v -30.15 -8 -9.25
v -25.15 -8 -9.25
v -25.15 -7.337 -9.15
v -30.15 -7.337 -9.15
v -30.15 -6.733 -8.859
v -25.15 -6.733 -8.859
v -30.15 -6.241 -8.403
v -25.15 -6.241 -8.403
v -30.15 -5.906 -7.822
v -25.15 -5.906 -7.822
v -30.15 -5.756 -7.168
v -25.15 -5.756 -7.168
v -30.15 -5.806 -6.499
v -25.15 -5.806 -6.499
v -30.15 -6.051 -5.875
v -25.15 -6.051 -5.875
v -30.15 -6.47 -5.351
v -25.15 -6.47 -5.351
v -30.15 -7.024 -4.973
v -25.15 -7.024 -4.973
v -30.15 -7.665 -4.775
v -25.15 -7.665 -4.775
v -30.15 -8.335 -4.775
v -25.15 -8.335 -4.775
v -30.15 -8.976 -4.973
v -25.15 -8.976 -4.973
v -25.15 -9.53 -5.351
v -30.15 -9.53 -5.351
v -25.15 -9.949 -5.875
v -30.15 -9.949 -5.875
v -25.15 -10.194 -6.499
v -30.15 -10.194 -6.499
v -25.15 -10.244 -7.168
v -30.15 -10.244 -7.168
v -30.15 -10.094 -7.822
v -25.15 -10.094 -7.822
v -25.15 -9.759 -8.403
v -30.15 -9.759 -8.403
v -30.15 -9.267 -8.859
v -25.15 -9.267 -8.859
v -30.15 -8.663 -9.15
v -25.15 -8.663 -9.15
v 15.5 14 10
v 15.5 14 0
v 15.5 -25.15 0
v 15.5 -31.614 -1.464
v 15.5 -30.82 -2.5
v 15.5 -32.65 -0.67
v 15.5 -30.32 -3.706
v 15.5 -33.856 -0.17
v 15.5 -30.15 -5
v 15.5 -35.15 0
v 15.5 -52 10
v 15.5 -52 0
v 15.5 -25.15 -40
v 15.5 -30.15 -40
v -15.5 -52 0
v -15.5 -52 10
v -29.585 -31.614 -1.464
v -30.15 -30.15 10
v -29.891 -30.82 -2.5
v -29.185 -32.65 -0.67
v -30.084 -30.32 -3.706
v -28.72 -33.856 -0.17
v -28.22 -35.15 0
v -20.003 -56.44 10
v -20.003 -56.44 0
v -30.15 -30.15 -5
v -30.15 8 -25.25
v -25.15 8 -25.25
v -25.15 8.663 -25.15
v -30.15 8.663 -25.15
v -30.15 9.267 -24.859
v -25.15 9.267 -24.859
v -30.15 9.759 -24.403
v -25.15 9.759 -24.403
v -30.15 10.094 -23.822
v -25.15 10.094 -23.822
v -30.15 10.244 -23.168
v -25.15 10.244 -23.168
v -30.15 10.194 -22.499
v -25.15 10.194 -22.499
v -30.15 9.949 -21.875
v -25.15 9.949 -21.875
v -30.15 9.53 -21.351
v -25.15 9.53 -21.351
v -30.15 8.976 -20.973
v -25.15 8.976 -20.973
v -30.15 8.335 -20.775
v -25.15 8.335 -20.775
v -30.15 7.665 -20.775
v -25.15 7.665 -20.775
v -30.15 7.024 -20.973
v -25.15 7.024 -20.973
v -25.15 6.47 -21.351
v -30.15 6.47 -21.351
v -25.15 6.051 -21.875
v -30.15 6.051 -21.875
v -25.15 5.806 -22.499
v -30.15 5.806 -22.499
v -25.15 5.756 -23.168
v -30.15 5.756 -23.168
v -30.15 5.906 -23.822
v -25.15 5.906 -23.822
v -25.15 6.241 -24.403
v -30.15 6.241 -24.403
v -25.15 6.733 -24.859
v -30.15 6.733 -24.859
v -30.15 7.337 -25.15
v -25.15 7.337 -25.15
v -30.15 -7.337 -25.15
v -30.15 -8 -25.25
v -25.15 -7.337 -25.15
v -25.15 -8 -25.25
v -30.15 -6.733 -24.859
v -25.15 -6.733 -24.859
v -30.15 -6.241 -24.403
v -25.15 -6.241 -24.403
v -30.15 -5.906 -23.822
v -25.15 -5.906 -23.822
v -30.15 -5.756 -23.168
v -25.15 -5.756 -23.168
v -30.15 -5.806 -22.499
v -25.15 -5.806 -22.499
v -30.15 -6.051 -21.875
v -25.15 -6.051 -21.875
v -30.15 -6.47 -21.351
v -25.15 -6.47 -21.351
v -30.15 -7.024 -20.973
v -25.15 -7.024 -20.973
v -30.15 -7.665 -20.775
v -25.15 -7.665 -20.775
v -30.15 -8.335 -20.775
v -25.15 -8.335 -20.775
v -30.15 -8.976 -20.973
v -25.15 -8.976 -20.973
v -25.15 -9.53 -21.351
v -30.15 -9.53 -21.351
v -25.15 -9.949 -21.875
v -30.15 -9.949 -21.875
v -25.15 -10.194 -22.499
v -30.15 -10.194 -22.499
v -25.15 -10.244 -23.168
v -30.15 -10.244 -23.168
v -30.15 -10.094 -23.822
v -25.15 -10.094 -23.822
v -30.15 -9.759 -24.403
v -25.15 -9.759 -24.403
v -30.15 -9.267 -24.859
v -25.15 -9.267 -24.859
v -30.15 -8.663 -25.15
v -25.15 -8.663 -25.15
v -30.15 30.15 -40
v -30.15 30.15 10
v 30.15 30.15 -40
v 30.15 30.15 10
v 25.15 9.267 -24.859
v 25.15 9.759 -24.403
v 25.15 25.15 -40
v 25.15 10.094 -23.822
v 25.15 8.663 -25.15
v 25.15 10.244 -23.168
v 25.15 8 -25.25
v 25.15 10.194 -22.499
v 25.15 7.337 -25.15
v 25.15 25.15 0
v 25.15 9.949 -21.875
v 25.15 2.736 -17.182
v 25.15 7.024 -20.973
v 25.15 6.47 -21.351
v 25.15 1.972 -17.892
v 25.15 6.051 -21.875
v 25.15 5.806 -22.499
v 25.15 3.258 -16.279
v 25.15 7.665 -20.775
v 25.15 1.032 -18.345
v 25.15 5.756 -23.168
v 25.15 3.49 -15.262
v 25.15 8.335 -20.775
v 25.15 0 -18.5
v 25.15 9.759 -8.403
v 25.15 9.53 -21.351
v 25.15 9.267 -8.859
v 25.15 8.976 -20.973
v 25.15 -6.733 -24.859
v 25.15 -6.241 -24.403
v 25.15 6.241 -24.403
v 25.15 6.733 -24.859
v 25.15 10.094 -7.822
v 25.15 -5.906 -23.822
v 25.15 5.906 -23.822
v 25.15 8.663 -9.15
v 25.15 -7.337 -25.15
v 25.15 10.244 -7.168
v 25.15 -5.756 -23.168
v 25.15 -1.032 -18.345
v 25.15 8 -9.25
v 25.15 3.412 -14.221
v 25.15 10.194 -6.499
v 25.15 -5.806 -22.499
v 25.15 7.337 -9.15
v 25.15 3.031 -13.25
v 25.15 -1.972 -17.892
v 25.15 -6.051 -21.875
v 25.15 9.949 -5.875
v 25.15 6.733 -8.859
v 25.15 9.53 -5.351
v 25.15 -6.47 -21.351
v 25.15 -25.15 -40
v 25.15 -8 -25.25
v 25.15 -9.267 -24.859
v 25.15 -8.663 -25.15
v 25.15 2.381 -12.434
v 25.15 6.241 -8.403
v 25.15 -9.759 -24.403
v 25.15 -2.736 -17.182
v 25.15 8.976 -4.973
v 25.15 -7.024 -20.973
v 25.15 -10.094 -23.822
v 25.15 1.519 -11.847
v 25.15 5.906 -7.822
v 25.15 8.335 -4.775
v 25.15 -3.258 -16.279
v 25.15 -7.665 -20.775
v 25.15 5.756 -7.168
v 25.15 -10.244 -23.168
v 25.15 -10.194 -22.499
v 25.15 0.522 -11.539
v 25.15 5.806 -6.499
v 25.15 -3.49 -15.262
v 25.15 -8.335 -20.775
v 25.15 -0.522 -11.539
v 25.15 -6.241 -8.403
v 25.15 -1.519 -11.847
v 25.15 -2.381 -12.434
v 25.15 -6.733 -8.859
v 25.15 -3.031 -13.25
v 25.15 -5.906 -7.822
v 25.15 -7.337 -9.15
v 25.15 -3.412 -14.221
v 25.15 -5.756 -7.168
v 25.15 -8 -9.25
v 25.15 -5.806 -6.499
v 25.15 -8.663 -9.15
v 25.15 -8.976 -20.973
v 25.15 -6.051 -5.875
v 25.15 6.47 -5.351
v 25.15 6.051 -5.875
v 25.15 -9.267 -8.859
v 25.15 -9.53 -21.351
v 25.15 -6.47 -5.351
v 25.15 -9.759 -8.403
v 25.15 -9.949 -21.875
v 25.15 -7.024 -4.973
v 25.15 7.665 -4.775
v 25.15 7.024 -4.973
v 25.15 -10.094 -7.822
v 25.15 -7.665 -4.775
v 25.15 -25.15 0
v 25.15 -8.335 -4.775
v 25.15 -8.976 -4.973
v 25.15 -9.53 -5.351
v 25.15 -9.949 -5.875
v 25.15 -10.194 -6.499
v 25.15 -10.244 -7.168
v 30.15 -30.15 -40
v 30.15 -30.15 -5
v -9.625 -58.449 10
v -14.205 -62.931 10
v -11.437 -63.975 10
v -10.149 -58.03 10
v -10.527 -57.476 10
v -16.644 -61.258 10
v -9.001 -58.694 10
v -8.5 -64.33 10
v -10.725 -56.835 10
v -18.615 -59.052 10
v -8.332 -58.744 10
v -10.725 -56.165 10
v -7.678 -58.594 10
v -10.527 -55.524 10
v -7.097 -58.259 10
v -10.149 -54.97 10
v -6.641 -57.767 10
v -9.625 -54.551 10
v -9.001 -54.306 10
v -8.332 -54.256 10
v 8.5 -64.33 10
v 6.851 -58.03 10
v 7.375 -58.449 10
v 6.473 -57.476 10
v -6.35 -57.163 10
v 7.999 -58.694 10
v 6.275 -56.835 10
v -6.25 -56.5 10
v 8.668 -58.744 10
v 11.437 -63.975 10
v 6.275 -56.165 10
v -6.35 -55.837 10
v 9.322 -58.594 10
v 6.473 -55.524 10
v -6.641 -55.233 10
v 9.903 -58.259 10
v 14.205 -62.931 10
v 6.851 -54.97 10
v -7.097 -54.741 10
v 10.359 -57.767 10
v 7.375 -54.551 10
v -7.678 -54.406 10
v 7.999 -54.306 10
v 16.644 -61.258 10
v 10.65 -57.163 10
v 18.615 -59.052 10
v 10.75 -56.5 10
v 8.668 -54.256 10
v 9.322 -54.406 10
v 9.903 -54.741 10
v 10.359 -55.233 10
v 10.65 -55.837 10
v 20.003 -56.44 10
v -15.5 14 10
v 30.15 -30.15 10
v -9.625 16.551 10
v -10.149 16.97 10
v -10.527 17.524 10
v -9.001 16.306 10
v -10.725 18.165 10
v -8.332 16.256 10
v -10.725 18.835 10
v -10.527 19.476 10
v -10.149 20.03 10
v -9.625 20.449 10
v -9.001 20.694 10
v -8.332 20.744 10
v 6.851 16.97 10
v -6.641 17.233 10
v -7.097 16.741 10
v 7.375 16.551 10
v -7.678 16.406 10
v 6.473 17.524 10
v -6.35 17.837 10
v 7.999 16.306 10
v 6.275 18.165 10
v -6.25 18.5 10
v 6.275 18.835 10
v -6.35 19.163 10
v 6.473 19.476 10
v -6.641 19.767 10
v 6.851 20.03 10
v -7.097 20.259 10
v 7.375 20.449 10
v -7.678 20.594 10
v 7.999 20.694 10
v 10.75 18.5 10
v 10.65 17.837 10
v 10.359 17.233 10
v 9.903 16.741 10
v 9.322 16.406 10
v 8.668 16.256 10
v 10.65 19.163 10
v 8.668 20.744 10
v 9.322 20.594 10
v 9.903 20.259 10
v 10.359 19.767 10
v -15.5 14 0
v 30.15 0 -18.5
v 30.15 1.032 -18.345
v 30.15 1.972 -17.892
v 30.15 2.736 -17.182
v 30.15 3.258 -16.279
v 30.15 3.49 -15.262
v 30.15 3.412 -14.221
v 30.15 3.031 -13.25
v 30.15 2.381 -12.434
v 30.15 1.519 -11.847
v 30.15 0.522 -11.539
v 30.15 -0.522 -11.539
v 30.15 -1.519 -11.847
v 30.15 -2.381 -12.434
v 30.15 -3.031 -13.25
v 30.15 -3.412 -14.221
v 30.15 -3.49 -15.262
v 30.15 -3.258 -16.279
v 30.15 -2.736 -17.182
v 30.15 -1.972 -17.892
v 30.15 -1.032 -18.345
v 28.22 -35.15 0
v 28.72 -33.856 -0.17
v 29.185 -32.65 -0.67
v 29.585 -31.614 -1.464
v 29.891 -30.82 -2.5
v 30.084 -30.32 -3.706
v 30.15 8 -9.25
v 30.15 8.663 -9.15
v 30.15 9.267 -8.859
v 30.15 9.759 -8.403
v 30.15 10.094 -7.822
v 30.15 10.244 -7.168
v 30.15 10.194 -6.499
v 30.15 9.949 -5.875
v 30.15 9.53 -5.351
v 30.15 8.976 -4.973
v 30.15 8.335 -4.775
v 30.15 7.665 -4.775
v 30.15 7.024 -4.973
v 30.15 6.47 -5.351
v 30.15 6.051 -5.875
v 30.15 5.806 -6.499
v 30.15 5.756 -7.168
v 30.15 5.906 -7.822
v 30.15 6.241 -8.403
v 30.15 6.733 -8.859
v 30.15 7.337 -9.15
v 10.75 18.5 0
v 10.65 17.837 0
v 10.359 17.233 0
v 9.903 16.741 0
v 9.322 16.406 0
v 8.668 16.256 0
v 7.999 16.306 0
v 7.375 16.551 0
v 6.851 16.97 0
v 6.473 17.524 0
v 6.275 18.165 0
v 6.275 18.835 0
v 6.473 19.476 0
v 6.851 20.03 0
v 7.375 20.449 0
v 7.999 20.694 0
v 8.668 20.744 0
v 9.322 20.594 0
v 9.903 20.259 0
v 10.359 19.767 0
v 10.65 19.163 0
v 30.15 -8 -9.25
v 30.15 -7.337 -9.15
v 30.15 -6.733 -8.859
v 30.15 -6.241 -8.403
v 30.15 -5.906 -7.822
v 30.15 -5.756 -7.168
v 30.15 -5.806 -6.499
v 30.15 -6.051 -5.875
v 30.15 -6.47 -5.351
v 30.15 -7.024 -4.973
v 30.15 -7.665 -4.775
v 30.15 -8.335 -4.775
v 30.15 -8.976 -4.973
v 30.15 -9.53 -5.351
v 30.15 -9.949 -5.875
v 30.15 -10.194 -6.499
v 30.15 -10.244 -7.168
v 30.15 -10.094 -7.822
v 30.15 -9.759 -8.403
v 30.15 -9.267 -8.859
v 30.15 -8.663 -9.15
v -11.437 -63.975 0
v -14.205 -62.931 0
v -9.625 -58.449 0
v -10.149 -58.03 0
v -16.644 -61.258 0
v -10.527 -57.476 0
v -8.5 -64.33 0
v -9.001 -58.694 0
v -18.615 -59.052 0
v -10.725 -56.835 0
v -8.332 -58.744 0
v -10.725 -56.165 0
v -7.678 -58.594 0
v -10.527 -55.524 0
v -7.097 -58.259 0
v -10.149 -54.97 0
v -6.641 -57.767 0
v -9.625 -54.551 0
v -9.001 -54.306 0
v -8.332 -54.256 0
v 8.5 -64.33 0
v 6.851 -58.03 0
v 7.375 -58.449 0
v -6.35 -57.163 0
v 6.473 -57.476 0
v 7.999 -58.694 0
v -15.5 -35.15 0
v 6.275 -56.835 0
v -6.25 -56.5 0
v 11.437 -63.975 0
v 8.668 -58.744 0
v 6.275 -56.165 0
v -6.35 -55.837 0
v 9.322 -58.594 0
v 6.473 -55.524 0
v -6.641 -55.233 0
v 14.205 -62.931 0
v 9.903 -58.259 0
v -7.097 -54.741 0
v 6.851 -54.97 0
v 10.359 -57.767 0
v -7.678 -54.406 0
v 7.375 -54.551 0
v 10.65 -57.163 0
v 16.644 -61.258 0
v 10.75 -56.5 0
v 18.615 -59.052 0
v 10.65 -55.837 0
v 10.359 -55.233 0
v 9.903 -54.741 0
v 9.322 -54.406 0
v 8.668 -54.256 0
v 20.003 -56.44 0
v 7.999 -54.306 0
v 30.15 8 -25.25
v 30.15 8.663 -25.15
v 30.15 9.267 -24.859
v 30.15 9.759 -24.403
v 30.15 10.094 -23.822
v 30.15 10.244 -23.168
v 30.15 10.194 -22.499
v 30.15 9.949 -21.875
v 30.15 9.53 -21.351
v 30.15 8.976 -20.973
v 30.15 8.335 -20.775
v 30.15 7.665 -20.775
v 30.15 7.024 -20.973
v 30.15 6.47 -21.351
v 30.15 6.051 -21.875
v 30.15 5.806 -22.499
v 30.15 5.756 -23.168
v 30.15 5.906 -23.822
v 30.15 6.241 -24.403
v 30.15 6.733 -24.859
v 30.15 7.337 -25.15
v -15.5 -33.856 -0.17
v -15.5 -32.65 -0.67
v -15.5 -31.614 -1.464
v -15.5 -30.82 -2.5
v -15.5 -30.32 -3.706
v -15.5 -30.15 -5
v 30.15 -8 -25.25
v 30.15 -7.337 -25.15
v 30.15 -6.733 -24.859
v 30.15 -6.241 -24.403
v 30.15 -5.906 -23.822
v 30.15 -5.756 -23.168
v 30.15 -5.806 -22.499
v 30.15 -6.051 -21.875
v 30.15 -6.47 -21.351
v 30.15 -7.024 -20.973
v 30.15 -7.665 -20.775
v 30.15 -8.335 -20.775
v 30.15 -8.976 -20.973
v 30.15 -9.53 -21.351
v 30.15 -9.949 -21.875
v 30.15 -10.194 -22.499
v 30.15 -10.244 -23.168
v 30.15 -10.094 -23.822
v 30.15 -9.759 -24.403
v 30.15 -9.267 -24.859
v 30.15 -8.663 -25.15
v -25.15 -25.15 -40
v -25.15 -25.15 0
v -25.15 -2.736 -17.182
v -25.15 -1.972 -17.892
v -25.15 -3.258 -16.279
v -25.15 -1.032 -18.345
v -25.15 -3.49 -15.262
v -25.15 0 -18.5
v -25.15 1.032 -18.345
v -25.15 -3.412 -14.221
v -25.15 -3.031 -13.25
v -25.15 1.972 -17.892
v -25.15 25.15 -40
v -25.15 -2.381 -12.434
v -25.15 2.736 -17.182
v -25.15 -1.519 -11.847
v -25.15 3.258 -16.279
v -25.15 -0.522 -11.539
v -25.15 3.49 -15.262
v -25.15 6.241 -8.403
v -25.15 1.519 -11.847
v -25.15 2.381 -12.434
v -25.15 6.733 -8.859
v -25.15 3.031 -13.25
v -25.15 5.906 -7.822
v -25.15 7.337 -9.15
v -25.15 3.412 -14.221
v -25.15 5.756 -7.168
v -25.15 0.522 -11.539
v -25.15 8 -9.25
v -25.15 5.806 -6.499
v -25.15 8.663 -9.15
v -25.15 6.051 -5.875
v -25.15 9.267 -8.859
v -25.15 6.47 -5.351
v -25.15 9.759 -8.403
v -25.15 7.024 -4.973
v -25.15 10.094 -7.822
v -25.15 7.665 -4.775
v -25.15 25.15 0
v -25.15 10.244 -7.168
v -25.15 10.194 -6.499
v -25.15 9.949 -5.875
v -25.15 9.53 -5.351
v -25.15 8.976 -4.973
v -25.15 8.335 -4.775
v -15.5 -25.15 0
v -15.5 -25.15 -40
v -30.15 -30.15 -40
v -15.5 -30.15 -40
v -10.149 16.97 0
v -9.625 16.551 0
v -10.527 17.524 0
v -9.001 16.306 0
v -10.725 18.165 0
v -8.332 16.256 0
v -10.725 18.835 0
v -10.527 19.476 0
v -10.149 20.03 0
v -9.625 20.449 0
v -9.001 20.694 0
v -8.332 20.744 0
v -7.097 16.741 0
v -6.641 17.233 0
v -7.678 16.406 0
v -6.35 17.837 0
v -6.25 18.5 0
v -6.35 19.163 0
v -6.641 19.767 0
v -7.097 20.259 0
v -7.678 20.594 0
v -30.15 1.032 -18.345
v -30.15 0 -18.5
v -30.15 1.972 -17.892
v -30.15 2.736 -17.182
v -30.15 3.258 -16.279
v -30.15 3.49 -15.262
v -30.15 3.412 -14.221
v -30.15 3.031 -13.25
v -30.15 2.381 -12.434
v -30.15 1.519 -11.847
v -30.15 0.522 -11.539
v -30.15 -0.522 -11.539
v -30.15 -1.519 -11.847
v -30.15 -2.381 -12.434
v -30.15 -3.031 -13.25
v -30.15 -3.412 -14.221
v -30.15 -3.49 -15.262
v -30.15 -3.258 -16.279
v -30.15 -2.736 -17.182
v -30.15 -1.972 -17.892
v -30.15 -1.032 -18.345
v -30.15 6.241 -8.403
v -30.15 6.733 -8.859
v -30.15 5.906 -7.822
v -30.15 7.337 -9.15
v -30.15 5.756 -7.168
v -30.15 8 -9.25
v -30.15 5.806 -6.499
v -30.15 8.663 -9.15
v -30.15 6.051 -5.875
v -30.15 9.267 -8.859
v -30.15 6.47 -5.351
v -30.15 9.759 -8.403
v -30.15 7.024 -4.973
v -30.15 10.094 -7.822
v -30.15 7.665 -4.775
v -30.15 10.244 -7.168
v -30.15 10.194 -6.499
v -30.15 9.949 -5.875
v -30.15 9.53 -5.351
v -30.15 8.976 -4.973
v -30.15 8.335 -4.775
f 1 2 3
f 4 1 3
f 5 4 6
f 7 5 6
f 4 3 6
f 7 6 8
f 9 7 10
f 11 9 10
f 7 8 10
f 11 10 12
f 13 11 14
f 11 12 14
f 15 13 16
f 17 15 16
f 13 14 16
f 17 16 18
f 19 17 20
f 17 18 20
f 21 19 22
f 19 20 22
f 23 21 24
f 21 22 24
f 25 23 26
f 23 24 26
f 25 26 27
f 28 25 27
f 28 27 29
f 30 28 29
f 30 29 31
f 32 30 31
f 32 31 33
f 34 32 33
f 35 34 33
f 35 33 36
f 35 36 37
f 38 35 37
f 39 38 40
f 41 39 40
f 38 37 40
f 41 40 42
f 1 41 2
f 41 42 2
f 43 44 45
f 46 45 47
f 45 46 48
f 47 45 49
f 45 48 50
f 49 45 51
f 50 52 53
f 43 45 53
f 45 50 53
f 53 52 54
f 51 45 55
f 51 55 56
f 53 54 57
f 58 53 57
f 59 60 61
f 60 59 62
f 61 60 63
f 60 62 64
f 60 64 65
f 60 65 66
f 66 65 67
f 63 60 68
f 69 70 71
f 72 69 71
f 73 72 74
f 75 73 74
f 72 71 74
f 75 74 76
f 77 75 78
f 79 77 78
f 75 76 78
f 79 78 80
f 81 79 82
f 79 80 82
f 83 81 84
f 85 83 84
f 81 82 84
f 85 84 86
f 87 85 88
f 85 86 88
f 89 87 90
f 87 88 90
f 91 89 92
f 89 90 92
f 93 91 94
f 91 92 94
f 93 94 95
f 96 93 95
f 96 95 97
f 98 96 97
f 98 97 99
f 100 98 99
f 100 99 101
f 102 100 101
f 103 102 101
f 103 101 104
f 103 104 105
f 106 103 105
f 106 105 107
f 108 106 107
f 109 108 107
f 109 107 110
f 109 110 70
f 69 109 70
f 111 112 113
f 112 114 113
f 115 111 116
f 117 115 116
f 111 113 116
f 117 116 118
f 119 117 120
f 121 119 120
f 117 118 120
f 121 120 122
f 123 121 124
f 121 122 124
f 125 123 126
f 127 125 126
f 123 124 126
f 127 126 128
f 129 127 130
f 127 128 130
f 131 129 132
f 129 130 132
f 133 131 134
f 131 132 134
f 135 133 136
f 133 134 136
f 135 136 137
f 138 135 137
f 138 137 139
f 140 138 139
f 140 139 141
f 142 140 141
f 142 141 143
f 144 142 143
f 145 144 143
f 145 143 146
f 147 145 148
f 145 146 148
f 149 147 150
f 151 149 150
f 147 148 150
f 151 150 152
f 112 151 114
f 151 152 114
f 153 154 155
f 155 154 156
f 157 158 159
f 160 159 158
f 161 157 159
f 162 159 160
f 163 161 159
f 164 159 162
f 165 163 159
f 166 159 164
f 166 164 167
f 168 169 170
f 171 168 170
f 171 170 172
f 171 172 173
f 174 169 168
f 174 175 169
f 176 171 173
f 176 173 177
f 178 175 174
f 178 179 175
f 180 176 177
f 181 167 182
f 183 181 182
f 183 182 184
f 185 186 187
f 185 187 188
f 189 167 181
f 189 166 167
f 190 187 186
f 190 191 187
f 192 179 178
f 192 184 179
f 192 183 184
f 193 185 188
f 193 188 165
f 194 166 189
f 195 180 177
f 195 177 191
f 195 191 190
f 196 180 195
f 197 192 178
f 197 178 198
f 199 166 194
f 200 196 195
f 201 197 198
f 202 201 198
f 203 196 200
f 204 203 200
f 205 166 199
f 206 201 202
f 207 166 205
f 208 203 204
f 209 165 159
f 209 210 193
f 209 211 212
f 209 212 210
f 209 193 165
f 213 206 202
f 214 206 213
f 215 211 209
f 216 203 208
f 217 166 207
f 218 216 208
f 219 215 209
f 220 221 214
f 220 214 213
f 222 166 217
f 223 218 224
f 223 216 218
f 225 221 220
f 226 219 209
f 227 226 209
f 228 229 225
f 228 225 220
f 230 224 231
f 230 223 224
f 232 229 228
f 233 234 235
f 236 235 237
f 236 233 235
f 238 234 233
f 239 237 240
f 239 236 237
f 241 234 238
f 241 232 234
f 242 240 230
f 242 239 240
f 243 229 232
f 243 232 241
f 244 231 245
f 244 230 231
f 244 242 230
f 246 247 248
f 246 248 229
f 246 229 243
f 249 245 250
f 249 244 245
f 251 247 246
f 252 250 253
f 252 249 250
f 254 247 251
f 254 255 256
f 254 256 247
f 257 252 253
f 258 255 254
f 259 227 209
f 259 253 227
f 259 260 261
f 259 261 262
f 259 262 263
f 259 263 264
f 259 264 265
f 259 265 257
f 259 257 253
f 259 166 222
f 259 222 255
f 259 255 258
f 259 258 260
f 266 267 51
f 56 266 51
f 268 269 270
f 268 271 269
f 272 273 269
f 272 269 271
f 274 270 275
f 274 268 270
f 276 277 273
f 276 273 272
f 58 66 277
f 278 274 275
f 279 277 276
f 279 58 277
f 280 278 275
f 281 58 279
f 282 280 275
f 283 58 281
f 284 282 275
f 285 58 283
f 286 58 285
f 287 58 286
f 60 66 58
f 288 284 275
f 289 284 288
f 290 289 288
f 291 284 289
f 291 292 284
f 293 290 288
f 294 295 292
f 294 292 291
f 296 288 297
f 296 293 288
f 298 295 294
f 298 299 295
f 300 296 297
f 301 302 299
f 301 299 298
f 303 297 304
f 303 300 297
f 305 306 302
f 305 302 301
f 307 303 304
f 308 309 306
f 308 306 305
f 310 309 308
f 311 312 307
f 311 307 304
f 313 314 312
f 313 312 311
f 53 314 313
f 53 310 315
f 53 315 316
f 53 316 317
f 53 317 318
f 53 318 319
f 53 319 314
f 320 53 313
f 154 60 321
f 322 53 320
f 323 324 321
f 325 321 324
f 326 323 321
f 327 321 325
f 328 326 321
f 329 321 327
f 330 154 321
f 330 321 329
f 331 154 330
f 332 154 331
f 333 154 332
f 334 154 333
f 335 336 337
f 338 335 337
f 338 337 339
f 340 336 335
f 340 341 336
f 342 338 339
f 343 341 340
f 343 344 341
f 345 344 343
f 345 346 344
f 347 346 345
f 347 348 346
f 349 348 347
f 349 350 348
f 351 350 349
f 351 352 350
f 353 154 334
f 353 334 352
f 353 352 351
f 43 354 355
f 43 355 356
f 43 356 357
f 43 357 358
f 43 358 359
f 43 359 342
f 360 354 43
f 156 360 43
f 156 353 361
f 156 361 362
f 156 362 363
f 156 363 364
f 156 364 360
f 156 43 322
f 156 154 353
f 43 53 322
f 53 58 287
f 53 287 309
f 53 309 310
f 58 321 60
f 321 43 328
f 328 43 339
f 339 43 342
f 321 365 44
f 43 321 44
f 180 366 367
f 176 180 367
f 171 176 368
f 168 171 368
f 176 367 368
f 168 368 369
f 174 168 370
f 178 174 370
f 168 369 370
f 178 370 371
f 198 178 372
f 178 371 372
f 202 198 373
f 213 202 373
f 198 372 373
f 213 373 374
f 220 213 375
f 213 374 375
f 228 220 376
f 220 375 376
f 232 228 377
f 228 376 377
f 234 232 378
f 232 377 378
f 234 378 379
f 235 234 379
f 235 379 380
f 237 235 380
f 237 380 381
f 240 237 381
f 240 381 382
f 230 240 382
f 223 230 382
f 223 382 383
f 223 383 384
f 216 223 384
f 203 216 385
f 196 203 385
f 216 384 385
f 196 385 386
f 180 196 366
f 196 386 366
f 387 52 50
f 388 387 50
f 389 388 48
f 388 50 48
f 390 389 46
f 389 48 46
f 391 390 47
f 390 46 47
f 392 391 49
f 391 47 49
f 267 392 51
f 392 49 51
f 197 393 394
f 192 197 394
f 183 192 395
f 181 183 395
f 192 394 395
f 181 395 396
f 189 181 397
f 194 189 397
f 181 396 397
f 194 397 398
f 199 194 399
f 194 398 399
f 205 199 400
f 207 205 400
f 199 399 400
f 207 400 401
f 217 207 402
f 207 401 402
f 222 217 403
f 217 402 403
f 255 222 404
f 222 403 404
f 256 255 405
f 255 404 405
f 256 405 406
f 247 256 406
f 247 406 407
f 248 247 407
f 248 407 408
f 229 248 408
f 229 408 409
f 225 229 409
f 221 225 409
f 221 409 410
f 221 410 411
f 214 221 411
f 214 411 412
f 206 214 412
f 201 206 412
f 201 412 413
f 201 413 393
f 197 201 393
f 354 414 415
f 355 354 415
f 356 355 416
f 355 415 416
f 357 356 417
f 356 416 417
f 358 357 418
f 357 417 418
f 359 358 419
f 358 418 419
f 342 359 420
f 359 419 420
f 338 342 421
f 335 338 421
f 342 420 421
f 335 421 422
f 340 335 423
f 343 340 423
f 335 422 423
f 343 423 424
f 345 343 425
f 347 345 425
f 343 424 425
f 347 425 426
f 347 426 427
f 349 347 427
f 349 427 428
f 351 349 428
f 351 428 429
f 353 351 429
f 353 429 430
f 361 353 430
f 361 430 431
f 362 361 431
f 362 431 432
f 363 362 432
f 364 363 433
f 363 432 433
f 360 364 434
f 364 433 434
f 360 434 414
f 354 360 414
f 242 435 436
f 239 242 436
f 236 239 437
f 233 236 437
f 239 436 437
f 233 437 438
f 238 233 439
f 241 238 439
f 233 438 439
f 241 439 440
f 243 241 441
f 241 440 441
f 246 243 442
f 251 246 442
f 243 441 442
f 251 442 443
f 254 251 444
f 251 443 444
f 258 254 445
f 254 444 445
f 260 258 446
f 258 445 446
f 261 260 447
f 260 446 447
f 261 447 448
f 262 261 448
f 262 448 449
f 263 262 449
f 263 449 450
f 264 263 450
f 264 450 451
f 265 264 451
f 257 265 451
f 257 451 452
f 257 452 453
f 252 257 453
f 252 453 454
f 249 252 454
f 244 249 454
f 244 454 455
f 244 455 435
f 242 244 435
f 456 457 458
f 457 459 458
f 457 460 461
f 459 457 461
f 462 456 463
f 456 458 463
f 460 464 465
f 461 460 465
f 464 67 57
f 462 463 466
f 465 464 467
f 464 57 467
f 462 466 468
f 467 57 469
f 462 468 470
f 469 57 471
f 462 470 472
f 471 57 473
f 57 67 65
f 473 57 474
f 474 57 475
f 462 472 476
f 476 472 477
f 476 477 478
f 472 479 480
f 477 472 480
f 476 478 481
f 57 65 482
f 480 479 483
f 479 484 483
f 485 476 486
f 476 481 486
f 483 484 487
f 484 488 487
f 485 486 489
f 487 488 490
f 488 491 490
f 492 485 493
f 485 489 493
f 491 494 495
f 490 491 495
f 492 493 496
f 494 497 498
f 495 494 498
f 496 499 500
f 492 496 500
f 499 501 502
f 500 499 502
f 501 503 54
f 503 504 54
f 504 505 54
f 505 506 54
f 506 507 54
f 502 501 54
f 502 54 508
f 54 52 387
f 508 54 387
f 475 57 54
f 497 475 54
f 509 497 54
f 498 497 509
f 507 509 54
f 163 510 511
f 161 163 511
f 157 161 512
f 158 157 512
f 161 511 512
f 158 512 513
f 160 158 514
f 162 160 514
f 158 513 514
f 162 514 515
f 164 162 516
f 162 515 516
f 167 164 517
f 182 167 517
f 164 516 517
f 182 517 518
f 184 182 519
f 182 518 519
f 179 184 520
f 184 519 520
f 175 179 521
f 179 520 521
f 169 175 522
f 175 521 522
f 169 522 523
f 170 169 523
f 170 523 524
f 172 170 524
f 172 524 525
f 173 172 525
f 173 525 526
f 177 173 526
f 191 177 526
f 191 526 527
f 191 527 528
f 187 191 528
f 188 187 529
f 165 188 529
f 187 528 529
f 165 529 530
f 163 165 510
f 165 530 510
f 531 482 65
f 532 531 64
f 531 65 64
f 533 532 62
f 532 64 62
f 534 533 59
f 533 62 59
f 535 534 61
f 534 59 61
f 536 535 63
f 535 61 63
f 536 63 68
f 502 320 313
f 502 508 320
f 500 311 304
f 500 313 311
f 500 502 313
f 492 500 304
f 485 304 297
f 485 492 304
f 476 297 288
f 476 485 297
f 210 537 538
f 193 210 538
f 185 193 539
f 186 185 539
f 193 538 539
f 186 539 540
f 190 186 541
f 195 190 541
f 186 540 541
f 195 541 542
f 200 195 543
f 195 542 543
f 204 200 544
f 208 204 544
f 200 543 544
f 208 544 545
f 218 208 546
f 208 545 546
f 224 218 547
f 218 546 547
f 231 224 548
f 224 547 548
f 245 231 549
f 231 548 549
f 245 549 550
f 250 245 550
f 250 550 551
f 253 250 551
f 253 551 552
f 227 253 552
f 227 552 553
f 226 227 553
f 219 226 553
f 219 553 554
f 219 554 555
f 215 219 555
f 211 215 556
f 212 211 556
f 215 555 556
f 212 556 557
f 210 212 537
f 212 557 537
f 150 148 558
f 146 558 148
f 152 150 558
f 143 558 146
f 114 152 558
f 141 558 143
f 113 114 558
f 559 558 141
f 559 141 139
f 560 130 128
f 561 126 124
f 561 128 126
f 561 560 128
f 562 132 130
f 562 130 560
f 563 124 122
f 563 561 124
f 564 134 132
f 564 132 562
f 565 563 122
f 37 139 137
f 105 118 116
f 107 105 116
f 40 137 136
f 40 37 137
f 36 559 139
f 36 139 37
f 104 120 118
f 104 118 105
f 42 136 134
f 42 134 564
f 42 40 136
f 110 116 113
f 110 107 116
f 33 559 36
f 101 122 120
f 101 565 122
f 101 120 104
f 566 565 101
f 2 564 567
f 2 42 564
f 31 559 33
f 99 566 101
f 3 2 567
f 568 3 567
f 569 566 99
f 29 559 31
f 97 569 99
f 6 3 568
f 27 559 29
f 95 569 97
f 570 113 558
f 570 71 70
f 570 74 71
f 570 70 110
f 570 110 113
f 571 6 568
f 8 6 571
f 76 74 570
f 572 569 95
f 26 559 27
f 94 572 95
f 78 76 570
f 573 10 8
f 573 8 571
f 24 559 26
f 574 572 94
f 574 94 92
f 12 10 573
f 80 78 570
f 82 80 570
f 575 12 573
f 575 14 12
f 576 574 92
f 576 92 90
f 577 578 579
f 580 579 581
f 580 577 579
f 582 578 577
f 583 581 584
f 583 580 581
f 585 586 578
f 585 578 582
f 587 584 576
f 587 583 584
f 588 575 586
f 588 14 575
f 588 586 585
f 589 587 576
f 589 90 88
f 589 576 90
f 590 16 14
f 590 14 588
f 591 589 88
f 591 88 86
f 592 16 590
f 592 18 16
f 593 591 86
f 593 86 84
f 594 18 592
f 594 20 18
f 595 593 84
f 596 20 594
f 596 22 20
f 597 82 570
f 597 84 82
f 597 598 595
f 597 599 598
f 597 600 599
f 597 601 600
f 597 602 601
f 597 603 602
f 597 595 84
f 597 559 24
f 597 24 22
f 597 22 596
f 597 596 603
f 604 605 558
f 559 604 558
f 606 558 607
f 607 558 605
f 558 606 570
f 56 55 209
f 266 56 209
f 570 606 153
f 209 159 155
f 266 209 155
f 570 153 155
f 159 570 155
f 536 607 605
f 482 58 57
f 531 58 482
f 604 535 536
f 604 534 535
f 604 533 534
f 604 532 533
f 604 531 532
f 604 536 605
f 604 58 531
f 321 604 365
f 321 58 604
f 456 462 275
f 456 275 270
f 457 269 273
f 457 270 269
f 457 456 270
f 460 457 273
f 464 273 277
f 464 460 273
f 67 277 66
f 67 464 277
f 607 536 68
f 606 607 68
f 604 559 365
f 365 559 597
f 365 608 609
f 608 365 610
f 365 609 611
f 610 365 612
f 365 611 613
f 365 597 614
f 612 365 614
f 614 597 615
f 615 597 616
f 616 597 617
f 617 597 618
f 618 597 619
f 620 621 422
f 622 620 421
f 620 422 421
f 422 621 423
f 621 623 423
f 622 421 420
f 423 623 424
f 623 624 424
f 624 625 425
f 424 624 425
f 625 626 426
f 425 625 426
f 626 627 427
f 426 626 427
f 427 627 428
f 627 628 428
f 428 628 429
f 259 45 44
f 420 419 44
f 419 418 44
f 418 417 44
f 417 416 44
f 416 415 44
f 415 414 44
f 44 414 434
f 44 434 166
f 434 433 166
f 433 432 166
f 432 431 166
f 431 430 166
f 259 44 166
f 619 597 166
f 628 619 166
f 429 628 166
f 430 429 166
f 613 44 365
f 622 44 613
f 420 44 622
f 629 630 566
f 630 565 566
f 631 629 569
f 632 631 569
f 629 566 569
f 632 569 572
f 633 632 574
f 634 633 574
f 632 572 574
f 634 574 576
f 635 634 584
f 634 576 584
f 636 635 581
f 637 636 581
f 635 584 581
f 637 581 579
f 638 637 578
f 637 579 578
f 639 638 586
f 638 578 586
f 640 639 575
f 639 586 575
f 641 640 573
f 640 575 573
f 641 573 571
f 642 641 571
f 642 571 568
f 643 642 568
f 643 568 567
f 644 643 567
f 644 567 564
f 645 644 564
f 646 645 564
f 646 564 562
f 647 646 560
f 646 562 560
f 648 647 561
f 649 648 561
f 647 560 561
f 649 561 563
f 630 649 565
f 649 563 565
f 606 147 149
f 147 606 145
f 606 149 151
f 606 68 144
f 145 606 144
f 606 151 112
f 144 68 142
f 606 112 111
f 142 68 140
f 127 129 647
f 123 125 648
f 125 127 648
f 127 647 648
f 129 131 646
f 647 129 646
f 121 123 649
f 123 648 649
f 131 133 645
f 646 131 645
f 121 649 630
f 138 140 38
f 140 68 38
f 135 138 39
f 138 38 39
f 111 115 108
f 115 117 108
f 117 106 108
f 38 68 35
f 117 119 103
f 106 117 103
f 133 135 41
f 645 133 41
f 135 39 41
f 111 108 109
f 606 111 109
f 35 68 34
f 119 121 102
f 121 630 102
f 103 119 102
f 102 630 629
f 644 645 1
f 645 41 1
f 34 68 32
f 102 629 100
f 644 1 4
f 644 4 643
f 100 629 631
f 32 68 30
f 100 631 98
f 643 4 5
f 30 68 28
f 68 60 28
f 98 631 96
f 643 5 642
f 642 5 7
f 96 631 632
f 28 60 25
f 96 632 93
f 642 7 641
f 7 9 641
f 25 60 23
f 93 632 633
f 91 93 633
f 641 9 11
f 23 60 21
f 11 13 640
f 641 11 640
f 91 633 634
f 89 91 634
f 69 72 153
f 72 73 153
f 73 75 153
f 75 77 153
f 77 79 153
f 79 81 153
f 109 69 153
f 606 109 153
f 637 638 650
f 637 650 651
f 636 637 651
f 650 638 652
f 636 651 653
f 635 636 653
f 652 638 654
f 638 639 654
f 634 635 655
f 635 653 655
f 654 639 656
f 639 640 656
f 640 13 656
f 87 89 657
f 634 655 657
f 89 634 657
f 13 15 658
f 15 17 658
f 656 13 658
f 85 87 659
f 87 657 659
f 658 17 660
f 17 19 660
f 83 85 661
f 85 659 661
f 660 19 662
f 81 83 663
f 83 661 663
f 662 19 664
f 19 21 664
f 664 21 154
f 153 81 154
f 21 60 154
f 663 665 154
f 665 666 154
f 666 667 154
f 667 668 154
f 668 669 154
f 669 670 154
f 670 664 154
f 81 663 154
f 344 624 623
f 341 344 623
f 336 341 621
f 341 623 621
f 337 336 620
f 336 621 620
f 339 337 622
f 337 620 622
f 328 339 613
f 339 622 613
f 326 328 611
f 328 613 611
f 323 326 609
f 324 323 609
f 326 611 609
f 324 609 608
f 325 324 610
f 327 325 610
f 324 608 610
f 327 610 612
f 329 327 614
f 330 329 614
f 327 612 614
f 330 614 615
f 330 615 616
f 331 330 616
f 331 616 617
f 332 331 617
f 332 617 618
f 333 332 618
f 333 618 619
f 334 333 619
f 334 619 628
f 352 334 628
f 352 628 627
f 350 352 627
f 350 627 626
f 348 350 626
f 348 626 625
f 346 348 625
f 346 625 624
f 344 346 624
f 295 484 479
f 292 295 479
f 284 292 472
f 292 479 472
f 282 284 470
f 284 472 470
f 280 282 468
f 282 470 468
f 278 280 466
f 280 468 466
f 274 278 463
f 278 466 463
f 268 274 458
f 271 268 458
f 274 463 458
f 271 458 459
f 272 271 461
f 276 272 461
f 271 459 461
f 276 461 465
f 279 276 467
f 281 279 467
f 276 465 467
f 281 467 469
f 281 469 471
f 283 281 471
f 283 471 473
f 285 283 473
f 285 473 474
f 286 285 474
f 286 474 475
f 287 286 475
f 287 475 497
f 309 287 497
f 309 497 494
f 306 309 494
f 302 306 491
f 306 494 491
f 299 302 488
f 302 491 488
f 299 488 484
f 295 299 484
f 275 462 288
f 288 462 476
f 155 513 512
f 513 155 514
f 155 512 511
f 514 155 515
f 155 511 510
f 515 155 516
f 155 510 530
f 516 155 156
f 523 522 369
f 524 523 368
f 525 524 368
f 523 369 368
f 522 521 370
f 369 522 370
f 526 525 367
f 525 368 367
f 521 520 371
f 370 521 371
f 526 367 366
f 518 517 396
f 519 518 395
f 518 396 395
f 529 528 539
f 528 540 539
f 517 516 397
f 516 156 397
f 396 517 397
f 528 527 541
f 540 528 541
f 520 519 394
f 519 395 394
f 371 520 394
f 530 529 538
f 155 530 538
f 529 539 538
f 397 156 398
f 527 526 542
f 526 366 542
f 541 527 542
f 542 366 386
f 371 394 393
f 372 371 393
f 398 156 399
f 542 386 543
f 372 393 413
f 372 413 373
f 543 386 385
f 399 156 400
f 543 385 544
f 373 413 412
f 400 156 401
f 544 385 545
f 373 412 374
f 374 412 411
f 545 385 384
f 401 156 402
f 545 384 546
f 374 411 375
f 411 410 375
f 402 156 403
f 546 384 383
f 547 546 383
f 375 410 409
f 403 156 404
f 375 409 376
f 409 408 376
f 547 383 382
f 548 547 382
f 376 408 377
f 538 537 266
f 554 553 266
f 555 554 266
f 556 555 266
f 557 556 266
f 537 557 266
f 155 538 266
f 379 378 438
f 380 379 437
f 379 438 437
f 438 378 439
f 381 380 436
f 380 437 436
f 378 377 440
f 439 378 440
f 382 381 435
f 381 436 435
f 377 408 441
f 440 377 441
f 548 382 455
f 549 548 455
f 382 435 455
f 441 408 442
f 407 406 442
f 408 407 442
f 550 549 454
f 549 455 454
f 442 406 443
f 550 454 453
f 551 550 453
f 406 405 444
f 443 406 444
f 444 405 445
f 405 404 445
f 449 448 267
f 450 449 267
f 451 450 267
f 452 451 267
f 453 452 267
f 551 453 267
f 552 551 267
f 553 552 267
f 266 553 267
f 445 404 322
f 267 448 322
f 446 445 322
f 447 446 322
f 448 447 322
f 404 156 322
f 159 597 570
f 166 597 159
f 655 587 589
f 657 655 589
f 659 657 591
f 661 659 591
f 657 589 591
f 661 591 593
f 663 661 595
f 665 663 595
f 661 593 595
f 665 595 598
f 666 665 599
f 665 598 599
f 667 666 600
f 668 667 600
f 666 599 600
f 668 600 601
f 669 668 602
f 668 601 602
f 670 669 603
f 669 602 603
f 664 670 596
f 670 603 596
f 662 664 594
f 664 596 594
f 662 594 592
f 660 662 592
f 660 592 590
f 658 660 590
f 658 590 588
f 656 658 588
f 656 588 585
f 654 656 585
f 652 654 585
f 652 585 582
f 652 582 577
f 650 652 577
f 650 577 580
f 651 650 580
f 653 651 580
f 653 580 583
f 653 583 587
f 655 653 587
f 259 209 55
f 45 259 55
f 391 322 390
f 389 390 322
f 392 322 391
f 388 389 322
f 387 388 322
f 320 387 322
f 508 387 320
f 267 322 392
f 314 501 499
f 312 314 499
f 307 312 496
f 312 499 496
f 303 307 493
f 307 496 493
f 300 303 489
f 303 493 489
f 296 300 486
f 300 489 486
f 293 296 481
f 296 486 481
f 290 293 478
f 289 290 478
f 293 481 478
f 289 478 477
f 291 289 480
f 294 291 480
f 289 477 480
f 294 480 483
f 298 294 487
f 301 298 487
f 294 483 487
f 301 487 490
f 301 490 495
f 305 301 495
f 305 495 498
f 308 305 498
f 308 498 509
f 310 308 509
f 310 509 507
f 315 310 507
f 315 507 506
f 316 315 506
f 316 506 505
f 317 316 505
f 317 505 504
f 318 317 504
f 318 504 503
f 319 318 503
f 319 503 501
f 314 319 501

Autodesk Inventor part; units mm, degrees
ref_plane "YZ Plane" through (0, 0, 0) normal (1, 0, 0) x (0, 1, 0)
ref_plane "XZ Plane" through (0, 0, 0) normal (0, 1, 0) x (-1, 0, 0)
ref_plane "XY Plane" through (0, 0, 0) normal (0, 0, 1) x (1, 0, 0)
sketch "Sketch1" plane through (0, 0, 0) normal (0, 0, 1) x (1, 0, 0)
  line L0 (-25.15, 25.15) -> (25.15, 25.15)
  line L1 (25.15, 25.15) -> (25.15, -25.15)
  line L2 (25.15, -25.15) -> (-25.15, -25.15)
  line L3 (-25.15, -25.15) -> (-25.15, 25.15)
  line L4 (-25.15, 25.15) -> (25.15, -25.15) construction
  line L5 (25.15, 25.15) -> (-25.15, -25.15) construction
  line L6 (-30.15, 30.15) -> (30.15, 30.15)
  line L7 (30.15, 30.15) -> (30.15, -30.15)
  line L8 (30.15, -30.15) -> (-30.15, -30.15)
  line L9 (-30.15, -30.15) -> (-30.15, 30.15)
  line L10 (-30.15, 30.15) -> (30.15, -30.15) construction
  line L11 (30.15, 30.15) -> (-30.15, -30.15) construction
  line L12 (0, 25.15) -> (0, 18.5) construction
  line L13 (0, 18.5) -> (8.5, 18.5) construction
  circle A0 centre (8.5, 18.5) radius 2.25
  line L14 (8.5, 18.5) -> (-8.5, 18.5)
  line L15 (-8.5, 18.5) -> (-8.5, -56.5)
  line L16 (-8.5, -56.5) -> (8.5, -56.5)
  line L17 (8.5, -56.5) -> (8.5, 18.5)
  circle A1 centre (8.5, -56.5) radius 2.25
  line L18 (-8.5, 18.5) -> (8.5, -56.5) construction
  line L19 (-15.5, 14) -> (15.5, 14)
  line L20 (15.5, 14) -> (15.5, -52)
  line L21 (15.5, -52) -> (-15.5, -52)
  line L22 (-15.5, -52) -> (-15.5, 14)
  line L23 (-15.5, 14) -> (15.5, -52) construction
  line L24 (15.5, 14) -> (-15.5, -52) construction
  circle A2 centre (-8.5, -56.5) radius 2.25
  circle A3 centre (-8.5, 18.5) radius 2.25
  line L25 (-30.15, -30.15) -> (-20.0032, -56.4398)
  arc A4 (-20.0032, -56.4398) -> (-8.5, -64.3302) centre (-8.5, -52) ccw
  line L26 (0, 0) -> (0, -19) construction
  line L27 (30.15, -30.15) -> (20.0032, -56.4398)
  line L28 (-8.5, -64.3302) -> (8.5, -64.3302)
  arc A5 (8.5, -64.3302) -> (20.0032, -56.4398) centre (8.5, -52) ccw
  point P0 (15.5, -25.15)
  point P1 (15.5, -30.15)
  point P2 (-15.5, -30.15)
  point P3 (-15.5, -25.15)
  dimension "d0" = 50.3
  dimension "d2" = 60.3
  dimension "d4" = 6.65
  dimension "d5" = 8.5
  dimension "d6" = 4.5
  dimension "d7" = 17
  dimension "d8" = 75
  dimension "d10" = 31
  dimension "d11" = 66
extrude "Extrusion1" add sketch "Sketch1" against normal blind 40 contours L3 L2 L22 L8 L9 L6 L7 L20 L1 L0
extrude "Extrusion2" add sketch "Sketch1" along normal blind 10 contours L3 L2 L22 L8 L9 L6 L7 L20 L1 L0 | L0 L1 L2 L20 L19 L17 A0 L14 A3 L15 L22 L3 | L22 L21 L15 A2 L16 A1 L17 L20 L8 L27 A5 L28 A4 L25 | L15 A3 L14 A0 L17 L19 | L21 L17 A1 L16 A2 L15
fillet "Fillet1" radius 5 2 edges at (22.825, -30.15, 0) (-22.825, -30.15, 0)
sketch "Sketch2" plane through (30.15, -30.15, -40) normal (1, 0, 0) x (0, 0, -1)
  line L0 (0, 60.3) -> (0, 0) projected
  line L1 (-10, 60.3) -> (-40, 60.3)
  line L2 (-40, 60.3) -> (-40, 0)
  line L3 (-40, 0) -> (-10, 0)
  line L4 (-10, 0) -> (-10, 60.3)
  line L5 (-35, 0) -> (0, 0) construction
  circle A0 centre (-25, 30.15) radius 3.5
  line L6 (0.0184, 0) -> (-9.9816, 0) construction
  line L7 (-35, 0) -> (0, 0) projected
  line L8 (-33, 38.15) -> (-17, 38.15) construction
  line L9 (-17, 38.15) -> (-17, 22.15) construction
  line L10 (-17, 22.15) -> (-33, 22.15) construction
  line L11 (-33, 22.15) -> (-33, 38.15) construction
  line L12 (-33, 38.15) -> (-17, 22.15) construction
  line L13 (-17, 38.15) -> (-33, 22.15) construction
  circle A1 centre (-33, 38.15) radius 2.25
  circle A2 centre (-17, 38.15) radius 2.25
  circle A3 centre (-17, 22.15) radius 2.25
  circle A4 centre (-33, 22.15) radius 2.25
  line L14 (-25, 30.15) -> (-20.3356, 34.8144) construction
  line L15 (-10, 60.3) -> (-40, 0) construction
  line L16 (-25, 30.15) -> (-30.0486, 30.15) construction
  point P0 (-40, 30.15)
  dimension "d20" = 30
  dimension "d21" = 7
  dimension "d24" = 10
  dimension "d25" = 16
  dimension "d27" = 4.5
  dimension "d28" = 60.3
extrude "Extrusion3" cut sketch "Sketch2" against normal blind 65 contours A0 | A1 | A2 | A3 | A4
properties part number "Servo-house" material "PBT Plastic"
